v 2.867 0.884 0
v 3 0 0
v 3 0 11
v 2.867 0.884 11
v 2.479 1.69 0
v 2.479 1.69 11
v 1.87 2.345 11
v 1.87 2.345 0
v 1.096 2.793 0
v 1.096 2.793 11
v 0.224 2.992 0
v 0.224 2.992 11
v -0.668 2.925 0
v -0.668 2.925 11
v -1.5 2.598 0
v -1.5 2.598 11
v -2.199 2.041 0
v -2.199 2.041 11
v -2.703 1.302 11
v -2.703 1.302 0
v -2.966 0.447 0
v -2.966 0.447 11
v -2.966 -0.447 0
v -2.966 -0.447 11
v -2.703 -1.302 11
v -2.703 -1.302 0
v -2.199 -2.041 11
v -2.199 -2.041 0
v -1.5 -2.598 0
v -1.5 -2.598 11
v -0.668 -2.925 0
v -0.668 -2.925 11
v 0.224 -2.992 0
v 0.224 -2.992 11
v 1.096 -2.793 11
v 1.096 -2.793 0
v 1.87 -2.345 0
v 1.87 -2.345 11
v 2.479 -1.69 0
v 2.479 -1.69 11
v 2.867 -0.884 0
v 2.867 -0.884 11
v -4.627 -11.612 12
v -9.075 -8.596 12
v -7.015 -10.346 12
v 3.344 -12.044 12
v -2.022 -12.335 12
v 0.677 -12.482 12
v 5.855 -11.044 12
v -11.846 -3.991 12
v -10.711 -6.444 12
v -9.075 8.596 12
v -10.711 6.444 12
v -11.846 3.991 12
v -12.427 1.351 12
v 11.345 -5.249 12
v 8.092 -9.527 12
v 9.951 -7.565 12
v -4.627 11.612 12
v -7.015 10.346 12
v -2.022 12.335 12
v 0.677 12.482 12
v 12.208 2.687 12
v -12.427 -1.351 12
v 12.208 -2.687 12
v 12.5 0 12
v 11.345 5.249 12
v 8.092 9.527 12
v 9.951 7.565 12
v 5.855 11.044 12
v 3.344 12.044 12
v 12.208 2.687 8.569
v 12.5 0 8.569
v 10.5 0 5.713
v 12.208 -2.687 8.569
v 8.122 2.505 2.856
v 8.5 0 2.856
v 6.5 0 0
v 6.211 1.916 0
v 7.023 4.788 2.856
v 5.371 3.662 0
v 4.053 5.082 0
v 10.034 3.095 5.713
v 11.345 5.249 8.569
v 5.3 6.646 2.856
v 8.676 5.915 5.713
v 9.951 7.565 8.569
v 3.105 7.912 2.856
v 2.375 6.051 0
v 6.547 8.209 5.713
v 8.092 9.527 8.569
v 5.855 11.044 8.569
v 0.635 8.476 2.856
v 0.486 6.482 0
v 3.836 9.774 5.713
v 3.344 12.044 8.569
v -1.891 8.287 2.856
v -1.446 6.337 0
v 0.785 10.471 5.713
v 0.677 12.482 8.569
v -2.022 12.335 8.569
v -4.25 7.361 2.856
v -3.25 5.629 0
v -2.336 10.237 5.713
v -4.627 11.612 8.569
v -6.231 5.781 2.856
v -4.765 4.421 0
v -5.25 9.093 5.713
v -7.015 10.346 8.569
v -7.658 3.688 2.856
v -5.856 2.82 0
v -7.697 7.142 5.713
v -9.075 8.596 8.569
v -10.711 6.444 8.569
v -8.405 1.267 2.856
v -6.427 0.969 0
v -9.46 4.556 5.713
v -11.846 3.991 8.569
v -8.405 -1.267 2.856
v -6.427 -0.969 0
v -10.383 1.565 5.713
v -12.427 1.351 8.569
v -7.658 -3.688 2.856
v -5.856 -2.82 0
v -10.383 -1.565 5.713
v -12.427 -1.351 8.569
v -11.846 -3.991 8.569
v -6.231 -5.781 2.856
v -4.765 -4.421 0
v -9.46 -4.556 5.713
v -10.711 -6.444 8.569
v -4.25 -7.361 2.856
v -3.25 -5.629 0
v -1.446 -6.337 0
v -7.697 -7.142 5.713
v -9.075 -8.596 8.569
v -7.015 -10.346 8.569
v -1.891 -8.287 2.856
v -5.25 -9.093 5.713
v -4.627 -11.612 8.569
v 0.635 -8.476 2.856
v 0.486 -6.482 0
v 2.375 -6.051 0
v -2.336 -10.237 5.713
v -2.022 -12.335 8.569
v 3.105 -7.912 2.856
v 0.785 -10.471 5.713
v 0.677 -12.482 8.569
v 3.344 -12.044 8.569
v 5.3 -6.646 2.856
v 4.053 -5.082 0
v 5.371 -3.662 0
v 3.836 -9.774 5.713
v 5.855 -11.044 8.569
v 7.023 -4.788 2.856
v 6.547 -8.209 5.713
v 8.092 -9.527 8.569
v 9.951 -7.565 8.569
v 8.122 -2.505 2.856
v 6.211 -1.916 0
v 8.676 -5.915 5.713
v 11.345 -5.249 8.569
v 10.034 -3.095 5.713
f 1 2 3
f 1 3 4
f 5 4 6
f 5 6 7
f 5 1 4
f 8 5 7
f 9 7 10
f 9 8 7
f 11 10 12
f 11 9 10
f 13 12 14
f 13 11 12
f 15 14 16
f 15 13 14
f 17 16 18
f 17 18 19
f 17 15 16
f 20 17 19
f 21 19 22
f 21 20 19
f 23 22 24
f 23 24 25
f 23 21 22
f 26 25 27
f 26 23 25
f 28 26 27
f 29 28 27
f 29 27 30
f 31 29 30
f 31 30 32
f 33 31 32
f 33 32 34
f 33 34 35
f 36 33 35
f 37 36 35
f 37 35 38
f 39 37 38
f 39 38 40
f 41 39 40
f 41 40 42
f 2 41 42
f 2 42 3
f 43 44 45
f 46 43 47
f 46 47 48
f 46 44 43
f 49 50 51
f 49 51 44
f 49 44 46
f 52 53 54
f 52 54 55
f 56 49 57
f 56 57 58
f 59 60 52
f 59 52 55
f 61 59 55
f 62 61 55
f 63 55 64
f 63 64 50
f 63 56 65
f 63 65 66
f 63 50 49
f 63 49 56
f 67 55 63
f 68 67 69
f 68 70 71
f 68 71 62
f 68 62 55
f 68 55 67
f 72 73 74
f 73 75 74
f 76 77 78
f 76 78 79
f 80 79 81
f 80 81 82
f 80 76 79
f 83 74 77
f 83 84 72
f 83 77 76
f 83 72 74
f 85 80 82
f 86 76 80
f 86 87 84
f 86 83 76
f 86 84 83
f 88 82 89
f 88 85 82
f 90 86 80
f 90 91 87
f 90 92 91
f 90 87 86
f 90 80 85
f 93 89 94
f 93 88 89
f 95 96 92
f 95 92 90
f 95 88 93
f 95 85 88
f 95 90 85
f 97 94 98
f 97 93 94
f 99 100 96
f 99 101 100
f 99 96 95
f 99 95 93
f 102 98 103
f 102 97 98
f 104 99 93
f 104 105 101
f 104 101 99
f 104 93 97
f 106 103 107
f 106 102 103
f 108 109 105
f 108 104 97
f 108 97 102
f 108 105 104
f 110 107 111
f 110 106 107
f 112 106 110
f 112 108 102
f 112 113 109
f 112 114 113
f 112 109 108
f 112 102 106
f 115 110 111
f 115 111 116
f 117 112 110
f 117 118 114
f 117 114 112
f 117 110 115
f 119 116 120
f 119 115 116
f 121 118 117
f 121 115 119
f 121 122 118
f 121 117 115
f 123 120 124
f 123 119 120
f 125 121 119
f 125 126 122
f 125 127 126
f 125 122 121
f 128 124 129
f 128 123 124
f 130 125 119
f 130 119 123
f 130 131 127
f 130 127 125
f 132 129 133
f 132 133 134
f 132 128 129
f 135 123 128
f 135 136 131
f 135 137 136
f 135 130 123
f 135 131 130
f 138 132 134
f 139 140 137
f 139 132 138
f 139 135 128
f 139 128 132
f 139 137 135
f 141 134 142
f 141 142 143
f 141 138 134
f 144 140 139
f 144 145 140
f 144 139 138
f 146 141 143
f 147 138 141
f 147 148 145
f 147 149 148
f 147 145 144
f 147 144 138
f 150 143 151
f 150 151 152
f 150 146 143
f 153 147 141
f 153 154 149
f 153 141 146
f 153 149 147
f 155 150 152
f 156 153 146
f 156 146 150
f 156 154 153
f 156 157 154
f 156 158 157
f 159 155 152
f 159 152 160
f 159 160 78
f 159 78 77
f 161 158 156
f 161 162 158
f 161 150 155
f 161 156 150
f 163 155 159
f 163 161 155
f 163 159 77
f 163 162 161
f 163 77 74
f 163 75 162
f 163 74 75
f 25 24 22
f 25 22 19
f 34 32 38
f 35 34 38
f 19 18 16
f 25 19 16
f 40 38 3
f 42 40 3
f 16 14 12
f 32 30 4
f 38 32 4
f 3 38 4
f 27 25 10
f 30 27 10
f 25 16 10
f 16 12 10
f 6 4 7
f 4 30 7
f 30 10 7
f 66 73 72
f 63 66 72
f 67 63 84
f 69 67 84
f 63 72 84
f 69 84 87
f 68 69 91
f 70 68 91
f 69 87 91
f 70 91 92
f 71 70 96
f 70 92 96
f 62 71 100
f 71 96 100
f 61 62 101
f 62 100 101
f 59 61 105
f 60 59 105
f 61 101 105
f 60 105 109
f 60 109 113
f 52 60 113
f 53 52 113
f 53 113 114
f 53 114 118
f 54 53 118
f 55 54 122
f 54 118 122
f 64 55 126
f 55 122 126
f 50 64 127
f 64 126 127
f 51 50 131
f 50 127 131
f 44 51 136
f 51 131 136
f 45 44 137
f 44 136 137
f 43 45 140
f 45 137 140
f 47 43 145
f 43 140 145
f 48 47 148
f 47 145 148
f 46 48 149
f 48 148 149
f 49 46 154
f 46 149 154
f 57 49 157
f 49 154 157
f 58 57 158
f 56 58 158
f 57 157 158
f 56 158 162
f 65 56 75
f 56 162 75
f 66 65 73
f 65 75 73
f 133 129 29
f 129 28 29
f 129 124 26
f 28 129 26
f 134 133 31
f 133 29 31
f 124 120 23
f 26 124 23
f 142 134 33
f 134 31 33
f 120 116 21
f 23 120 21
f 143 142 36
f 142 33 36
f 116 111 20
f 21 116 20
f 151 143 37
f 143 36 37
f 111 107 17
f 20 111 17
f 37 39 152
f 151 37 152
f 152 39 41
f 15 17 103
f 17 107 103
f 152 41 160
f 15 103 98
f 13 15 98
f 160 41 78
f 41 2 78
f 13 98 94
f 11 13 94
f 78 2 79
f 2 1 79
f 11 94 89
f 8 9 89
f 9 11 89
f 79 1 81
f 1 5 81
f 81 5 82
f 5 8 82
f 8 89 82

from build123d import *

# Parameters (mm, degrees)
SKETCH1_R           = 12.5
SKETCH1_R_2         = 3
BOSS_EXTRUDE1_DEPTH = 12
SKETCH2_R           = 3
BOSS_EXTRUDE2_DEPTH = 1
CHAMFER1_SIZE       = 6
CHAMFER1_SIZE2      = 8.56888804


with BuildPart() as part:
    # Sketch1 → Boss-Extrude1 (new body)
    with BuildSketch(Plane.XY):
        Circle(SKETCH1_R)
        Circle(SKETCH1_R_2, mode=Mode.SUBTRACT)
    extrude(amount=BOSS_EXTRUDE1_DEPTH)

    # Sketch2 → Boss-Extrude2 (add)
    with BuildSketch(Plane.XY.offset(12)):
        Circle(SKETCH2_R)
    extrude(amount=-BOSS_EXTRUDE2_DEPTH)

    # Chamfer1
    chamfer1_edges = [part.edges().sort_by_distance(p)[0] for p in [
        (-12.5, 0, 0),
    ]]
    chamfer1_side = [part.faces().sort_by_distance(p)[0] for p in [
        (-12.146446609, 0, 0),
    ]]
    chamfer(chamfer1_edges, length=CHAMFER1_SIZE, length2=CHAMFER1_SIZE2, reference=chamfer1_side[0])


solid = part.part
